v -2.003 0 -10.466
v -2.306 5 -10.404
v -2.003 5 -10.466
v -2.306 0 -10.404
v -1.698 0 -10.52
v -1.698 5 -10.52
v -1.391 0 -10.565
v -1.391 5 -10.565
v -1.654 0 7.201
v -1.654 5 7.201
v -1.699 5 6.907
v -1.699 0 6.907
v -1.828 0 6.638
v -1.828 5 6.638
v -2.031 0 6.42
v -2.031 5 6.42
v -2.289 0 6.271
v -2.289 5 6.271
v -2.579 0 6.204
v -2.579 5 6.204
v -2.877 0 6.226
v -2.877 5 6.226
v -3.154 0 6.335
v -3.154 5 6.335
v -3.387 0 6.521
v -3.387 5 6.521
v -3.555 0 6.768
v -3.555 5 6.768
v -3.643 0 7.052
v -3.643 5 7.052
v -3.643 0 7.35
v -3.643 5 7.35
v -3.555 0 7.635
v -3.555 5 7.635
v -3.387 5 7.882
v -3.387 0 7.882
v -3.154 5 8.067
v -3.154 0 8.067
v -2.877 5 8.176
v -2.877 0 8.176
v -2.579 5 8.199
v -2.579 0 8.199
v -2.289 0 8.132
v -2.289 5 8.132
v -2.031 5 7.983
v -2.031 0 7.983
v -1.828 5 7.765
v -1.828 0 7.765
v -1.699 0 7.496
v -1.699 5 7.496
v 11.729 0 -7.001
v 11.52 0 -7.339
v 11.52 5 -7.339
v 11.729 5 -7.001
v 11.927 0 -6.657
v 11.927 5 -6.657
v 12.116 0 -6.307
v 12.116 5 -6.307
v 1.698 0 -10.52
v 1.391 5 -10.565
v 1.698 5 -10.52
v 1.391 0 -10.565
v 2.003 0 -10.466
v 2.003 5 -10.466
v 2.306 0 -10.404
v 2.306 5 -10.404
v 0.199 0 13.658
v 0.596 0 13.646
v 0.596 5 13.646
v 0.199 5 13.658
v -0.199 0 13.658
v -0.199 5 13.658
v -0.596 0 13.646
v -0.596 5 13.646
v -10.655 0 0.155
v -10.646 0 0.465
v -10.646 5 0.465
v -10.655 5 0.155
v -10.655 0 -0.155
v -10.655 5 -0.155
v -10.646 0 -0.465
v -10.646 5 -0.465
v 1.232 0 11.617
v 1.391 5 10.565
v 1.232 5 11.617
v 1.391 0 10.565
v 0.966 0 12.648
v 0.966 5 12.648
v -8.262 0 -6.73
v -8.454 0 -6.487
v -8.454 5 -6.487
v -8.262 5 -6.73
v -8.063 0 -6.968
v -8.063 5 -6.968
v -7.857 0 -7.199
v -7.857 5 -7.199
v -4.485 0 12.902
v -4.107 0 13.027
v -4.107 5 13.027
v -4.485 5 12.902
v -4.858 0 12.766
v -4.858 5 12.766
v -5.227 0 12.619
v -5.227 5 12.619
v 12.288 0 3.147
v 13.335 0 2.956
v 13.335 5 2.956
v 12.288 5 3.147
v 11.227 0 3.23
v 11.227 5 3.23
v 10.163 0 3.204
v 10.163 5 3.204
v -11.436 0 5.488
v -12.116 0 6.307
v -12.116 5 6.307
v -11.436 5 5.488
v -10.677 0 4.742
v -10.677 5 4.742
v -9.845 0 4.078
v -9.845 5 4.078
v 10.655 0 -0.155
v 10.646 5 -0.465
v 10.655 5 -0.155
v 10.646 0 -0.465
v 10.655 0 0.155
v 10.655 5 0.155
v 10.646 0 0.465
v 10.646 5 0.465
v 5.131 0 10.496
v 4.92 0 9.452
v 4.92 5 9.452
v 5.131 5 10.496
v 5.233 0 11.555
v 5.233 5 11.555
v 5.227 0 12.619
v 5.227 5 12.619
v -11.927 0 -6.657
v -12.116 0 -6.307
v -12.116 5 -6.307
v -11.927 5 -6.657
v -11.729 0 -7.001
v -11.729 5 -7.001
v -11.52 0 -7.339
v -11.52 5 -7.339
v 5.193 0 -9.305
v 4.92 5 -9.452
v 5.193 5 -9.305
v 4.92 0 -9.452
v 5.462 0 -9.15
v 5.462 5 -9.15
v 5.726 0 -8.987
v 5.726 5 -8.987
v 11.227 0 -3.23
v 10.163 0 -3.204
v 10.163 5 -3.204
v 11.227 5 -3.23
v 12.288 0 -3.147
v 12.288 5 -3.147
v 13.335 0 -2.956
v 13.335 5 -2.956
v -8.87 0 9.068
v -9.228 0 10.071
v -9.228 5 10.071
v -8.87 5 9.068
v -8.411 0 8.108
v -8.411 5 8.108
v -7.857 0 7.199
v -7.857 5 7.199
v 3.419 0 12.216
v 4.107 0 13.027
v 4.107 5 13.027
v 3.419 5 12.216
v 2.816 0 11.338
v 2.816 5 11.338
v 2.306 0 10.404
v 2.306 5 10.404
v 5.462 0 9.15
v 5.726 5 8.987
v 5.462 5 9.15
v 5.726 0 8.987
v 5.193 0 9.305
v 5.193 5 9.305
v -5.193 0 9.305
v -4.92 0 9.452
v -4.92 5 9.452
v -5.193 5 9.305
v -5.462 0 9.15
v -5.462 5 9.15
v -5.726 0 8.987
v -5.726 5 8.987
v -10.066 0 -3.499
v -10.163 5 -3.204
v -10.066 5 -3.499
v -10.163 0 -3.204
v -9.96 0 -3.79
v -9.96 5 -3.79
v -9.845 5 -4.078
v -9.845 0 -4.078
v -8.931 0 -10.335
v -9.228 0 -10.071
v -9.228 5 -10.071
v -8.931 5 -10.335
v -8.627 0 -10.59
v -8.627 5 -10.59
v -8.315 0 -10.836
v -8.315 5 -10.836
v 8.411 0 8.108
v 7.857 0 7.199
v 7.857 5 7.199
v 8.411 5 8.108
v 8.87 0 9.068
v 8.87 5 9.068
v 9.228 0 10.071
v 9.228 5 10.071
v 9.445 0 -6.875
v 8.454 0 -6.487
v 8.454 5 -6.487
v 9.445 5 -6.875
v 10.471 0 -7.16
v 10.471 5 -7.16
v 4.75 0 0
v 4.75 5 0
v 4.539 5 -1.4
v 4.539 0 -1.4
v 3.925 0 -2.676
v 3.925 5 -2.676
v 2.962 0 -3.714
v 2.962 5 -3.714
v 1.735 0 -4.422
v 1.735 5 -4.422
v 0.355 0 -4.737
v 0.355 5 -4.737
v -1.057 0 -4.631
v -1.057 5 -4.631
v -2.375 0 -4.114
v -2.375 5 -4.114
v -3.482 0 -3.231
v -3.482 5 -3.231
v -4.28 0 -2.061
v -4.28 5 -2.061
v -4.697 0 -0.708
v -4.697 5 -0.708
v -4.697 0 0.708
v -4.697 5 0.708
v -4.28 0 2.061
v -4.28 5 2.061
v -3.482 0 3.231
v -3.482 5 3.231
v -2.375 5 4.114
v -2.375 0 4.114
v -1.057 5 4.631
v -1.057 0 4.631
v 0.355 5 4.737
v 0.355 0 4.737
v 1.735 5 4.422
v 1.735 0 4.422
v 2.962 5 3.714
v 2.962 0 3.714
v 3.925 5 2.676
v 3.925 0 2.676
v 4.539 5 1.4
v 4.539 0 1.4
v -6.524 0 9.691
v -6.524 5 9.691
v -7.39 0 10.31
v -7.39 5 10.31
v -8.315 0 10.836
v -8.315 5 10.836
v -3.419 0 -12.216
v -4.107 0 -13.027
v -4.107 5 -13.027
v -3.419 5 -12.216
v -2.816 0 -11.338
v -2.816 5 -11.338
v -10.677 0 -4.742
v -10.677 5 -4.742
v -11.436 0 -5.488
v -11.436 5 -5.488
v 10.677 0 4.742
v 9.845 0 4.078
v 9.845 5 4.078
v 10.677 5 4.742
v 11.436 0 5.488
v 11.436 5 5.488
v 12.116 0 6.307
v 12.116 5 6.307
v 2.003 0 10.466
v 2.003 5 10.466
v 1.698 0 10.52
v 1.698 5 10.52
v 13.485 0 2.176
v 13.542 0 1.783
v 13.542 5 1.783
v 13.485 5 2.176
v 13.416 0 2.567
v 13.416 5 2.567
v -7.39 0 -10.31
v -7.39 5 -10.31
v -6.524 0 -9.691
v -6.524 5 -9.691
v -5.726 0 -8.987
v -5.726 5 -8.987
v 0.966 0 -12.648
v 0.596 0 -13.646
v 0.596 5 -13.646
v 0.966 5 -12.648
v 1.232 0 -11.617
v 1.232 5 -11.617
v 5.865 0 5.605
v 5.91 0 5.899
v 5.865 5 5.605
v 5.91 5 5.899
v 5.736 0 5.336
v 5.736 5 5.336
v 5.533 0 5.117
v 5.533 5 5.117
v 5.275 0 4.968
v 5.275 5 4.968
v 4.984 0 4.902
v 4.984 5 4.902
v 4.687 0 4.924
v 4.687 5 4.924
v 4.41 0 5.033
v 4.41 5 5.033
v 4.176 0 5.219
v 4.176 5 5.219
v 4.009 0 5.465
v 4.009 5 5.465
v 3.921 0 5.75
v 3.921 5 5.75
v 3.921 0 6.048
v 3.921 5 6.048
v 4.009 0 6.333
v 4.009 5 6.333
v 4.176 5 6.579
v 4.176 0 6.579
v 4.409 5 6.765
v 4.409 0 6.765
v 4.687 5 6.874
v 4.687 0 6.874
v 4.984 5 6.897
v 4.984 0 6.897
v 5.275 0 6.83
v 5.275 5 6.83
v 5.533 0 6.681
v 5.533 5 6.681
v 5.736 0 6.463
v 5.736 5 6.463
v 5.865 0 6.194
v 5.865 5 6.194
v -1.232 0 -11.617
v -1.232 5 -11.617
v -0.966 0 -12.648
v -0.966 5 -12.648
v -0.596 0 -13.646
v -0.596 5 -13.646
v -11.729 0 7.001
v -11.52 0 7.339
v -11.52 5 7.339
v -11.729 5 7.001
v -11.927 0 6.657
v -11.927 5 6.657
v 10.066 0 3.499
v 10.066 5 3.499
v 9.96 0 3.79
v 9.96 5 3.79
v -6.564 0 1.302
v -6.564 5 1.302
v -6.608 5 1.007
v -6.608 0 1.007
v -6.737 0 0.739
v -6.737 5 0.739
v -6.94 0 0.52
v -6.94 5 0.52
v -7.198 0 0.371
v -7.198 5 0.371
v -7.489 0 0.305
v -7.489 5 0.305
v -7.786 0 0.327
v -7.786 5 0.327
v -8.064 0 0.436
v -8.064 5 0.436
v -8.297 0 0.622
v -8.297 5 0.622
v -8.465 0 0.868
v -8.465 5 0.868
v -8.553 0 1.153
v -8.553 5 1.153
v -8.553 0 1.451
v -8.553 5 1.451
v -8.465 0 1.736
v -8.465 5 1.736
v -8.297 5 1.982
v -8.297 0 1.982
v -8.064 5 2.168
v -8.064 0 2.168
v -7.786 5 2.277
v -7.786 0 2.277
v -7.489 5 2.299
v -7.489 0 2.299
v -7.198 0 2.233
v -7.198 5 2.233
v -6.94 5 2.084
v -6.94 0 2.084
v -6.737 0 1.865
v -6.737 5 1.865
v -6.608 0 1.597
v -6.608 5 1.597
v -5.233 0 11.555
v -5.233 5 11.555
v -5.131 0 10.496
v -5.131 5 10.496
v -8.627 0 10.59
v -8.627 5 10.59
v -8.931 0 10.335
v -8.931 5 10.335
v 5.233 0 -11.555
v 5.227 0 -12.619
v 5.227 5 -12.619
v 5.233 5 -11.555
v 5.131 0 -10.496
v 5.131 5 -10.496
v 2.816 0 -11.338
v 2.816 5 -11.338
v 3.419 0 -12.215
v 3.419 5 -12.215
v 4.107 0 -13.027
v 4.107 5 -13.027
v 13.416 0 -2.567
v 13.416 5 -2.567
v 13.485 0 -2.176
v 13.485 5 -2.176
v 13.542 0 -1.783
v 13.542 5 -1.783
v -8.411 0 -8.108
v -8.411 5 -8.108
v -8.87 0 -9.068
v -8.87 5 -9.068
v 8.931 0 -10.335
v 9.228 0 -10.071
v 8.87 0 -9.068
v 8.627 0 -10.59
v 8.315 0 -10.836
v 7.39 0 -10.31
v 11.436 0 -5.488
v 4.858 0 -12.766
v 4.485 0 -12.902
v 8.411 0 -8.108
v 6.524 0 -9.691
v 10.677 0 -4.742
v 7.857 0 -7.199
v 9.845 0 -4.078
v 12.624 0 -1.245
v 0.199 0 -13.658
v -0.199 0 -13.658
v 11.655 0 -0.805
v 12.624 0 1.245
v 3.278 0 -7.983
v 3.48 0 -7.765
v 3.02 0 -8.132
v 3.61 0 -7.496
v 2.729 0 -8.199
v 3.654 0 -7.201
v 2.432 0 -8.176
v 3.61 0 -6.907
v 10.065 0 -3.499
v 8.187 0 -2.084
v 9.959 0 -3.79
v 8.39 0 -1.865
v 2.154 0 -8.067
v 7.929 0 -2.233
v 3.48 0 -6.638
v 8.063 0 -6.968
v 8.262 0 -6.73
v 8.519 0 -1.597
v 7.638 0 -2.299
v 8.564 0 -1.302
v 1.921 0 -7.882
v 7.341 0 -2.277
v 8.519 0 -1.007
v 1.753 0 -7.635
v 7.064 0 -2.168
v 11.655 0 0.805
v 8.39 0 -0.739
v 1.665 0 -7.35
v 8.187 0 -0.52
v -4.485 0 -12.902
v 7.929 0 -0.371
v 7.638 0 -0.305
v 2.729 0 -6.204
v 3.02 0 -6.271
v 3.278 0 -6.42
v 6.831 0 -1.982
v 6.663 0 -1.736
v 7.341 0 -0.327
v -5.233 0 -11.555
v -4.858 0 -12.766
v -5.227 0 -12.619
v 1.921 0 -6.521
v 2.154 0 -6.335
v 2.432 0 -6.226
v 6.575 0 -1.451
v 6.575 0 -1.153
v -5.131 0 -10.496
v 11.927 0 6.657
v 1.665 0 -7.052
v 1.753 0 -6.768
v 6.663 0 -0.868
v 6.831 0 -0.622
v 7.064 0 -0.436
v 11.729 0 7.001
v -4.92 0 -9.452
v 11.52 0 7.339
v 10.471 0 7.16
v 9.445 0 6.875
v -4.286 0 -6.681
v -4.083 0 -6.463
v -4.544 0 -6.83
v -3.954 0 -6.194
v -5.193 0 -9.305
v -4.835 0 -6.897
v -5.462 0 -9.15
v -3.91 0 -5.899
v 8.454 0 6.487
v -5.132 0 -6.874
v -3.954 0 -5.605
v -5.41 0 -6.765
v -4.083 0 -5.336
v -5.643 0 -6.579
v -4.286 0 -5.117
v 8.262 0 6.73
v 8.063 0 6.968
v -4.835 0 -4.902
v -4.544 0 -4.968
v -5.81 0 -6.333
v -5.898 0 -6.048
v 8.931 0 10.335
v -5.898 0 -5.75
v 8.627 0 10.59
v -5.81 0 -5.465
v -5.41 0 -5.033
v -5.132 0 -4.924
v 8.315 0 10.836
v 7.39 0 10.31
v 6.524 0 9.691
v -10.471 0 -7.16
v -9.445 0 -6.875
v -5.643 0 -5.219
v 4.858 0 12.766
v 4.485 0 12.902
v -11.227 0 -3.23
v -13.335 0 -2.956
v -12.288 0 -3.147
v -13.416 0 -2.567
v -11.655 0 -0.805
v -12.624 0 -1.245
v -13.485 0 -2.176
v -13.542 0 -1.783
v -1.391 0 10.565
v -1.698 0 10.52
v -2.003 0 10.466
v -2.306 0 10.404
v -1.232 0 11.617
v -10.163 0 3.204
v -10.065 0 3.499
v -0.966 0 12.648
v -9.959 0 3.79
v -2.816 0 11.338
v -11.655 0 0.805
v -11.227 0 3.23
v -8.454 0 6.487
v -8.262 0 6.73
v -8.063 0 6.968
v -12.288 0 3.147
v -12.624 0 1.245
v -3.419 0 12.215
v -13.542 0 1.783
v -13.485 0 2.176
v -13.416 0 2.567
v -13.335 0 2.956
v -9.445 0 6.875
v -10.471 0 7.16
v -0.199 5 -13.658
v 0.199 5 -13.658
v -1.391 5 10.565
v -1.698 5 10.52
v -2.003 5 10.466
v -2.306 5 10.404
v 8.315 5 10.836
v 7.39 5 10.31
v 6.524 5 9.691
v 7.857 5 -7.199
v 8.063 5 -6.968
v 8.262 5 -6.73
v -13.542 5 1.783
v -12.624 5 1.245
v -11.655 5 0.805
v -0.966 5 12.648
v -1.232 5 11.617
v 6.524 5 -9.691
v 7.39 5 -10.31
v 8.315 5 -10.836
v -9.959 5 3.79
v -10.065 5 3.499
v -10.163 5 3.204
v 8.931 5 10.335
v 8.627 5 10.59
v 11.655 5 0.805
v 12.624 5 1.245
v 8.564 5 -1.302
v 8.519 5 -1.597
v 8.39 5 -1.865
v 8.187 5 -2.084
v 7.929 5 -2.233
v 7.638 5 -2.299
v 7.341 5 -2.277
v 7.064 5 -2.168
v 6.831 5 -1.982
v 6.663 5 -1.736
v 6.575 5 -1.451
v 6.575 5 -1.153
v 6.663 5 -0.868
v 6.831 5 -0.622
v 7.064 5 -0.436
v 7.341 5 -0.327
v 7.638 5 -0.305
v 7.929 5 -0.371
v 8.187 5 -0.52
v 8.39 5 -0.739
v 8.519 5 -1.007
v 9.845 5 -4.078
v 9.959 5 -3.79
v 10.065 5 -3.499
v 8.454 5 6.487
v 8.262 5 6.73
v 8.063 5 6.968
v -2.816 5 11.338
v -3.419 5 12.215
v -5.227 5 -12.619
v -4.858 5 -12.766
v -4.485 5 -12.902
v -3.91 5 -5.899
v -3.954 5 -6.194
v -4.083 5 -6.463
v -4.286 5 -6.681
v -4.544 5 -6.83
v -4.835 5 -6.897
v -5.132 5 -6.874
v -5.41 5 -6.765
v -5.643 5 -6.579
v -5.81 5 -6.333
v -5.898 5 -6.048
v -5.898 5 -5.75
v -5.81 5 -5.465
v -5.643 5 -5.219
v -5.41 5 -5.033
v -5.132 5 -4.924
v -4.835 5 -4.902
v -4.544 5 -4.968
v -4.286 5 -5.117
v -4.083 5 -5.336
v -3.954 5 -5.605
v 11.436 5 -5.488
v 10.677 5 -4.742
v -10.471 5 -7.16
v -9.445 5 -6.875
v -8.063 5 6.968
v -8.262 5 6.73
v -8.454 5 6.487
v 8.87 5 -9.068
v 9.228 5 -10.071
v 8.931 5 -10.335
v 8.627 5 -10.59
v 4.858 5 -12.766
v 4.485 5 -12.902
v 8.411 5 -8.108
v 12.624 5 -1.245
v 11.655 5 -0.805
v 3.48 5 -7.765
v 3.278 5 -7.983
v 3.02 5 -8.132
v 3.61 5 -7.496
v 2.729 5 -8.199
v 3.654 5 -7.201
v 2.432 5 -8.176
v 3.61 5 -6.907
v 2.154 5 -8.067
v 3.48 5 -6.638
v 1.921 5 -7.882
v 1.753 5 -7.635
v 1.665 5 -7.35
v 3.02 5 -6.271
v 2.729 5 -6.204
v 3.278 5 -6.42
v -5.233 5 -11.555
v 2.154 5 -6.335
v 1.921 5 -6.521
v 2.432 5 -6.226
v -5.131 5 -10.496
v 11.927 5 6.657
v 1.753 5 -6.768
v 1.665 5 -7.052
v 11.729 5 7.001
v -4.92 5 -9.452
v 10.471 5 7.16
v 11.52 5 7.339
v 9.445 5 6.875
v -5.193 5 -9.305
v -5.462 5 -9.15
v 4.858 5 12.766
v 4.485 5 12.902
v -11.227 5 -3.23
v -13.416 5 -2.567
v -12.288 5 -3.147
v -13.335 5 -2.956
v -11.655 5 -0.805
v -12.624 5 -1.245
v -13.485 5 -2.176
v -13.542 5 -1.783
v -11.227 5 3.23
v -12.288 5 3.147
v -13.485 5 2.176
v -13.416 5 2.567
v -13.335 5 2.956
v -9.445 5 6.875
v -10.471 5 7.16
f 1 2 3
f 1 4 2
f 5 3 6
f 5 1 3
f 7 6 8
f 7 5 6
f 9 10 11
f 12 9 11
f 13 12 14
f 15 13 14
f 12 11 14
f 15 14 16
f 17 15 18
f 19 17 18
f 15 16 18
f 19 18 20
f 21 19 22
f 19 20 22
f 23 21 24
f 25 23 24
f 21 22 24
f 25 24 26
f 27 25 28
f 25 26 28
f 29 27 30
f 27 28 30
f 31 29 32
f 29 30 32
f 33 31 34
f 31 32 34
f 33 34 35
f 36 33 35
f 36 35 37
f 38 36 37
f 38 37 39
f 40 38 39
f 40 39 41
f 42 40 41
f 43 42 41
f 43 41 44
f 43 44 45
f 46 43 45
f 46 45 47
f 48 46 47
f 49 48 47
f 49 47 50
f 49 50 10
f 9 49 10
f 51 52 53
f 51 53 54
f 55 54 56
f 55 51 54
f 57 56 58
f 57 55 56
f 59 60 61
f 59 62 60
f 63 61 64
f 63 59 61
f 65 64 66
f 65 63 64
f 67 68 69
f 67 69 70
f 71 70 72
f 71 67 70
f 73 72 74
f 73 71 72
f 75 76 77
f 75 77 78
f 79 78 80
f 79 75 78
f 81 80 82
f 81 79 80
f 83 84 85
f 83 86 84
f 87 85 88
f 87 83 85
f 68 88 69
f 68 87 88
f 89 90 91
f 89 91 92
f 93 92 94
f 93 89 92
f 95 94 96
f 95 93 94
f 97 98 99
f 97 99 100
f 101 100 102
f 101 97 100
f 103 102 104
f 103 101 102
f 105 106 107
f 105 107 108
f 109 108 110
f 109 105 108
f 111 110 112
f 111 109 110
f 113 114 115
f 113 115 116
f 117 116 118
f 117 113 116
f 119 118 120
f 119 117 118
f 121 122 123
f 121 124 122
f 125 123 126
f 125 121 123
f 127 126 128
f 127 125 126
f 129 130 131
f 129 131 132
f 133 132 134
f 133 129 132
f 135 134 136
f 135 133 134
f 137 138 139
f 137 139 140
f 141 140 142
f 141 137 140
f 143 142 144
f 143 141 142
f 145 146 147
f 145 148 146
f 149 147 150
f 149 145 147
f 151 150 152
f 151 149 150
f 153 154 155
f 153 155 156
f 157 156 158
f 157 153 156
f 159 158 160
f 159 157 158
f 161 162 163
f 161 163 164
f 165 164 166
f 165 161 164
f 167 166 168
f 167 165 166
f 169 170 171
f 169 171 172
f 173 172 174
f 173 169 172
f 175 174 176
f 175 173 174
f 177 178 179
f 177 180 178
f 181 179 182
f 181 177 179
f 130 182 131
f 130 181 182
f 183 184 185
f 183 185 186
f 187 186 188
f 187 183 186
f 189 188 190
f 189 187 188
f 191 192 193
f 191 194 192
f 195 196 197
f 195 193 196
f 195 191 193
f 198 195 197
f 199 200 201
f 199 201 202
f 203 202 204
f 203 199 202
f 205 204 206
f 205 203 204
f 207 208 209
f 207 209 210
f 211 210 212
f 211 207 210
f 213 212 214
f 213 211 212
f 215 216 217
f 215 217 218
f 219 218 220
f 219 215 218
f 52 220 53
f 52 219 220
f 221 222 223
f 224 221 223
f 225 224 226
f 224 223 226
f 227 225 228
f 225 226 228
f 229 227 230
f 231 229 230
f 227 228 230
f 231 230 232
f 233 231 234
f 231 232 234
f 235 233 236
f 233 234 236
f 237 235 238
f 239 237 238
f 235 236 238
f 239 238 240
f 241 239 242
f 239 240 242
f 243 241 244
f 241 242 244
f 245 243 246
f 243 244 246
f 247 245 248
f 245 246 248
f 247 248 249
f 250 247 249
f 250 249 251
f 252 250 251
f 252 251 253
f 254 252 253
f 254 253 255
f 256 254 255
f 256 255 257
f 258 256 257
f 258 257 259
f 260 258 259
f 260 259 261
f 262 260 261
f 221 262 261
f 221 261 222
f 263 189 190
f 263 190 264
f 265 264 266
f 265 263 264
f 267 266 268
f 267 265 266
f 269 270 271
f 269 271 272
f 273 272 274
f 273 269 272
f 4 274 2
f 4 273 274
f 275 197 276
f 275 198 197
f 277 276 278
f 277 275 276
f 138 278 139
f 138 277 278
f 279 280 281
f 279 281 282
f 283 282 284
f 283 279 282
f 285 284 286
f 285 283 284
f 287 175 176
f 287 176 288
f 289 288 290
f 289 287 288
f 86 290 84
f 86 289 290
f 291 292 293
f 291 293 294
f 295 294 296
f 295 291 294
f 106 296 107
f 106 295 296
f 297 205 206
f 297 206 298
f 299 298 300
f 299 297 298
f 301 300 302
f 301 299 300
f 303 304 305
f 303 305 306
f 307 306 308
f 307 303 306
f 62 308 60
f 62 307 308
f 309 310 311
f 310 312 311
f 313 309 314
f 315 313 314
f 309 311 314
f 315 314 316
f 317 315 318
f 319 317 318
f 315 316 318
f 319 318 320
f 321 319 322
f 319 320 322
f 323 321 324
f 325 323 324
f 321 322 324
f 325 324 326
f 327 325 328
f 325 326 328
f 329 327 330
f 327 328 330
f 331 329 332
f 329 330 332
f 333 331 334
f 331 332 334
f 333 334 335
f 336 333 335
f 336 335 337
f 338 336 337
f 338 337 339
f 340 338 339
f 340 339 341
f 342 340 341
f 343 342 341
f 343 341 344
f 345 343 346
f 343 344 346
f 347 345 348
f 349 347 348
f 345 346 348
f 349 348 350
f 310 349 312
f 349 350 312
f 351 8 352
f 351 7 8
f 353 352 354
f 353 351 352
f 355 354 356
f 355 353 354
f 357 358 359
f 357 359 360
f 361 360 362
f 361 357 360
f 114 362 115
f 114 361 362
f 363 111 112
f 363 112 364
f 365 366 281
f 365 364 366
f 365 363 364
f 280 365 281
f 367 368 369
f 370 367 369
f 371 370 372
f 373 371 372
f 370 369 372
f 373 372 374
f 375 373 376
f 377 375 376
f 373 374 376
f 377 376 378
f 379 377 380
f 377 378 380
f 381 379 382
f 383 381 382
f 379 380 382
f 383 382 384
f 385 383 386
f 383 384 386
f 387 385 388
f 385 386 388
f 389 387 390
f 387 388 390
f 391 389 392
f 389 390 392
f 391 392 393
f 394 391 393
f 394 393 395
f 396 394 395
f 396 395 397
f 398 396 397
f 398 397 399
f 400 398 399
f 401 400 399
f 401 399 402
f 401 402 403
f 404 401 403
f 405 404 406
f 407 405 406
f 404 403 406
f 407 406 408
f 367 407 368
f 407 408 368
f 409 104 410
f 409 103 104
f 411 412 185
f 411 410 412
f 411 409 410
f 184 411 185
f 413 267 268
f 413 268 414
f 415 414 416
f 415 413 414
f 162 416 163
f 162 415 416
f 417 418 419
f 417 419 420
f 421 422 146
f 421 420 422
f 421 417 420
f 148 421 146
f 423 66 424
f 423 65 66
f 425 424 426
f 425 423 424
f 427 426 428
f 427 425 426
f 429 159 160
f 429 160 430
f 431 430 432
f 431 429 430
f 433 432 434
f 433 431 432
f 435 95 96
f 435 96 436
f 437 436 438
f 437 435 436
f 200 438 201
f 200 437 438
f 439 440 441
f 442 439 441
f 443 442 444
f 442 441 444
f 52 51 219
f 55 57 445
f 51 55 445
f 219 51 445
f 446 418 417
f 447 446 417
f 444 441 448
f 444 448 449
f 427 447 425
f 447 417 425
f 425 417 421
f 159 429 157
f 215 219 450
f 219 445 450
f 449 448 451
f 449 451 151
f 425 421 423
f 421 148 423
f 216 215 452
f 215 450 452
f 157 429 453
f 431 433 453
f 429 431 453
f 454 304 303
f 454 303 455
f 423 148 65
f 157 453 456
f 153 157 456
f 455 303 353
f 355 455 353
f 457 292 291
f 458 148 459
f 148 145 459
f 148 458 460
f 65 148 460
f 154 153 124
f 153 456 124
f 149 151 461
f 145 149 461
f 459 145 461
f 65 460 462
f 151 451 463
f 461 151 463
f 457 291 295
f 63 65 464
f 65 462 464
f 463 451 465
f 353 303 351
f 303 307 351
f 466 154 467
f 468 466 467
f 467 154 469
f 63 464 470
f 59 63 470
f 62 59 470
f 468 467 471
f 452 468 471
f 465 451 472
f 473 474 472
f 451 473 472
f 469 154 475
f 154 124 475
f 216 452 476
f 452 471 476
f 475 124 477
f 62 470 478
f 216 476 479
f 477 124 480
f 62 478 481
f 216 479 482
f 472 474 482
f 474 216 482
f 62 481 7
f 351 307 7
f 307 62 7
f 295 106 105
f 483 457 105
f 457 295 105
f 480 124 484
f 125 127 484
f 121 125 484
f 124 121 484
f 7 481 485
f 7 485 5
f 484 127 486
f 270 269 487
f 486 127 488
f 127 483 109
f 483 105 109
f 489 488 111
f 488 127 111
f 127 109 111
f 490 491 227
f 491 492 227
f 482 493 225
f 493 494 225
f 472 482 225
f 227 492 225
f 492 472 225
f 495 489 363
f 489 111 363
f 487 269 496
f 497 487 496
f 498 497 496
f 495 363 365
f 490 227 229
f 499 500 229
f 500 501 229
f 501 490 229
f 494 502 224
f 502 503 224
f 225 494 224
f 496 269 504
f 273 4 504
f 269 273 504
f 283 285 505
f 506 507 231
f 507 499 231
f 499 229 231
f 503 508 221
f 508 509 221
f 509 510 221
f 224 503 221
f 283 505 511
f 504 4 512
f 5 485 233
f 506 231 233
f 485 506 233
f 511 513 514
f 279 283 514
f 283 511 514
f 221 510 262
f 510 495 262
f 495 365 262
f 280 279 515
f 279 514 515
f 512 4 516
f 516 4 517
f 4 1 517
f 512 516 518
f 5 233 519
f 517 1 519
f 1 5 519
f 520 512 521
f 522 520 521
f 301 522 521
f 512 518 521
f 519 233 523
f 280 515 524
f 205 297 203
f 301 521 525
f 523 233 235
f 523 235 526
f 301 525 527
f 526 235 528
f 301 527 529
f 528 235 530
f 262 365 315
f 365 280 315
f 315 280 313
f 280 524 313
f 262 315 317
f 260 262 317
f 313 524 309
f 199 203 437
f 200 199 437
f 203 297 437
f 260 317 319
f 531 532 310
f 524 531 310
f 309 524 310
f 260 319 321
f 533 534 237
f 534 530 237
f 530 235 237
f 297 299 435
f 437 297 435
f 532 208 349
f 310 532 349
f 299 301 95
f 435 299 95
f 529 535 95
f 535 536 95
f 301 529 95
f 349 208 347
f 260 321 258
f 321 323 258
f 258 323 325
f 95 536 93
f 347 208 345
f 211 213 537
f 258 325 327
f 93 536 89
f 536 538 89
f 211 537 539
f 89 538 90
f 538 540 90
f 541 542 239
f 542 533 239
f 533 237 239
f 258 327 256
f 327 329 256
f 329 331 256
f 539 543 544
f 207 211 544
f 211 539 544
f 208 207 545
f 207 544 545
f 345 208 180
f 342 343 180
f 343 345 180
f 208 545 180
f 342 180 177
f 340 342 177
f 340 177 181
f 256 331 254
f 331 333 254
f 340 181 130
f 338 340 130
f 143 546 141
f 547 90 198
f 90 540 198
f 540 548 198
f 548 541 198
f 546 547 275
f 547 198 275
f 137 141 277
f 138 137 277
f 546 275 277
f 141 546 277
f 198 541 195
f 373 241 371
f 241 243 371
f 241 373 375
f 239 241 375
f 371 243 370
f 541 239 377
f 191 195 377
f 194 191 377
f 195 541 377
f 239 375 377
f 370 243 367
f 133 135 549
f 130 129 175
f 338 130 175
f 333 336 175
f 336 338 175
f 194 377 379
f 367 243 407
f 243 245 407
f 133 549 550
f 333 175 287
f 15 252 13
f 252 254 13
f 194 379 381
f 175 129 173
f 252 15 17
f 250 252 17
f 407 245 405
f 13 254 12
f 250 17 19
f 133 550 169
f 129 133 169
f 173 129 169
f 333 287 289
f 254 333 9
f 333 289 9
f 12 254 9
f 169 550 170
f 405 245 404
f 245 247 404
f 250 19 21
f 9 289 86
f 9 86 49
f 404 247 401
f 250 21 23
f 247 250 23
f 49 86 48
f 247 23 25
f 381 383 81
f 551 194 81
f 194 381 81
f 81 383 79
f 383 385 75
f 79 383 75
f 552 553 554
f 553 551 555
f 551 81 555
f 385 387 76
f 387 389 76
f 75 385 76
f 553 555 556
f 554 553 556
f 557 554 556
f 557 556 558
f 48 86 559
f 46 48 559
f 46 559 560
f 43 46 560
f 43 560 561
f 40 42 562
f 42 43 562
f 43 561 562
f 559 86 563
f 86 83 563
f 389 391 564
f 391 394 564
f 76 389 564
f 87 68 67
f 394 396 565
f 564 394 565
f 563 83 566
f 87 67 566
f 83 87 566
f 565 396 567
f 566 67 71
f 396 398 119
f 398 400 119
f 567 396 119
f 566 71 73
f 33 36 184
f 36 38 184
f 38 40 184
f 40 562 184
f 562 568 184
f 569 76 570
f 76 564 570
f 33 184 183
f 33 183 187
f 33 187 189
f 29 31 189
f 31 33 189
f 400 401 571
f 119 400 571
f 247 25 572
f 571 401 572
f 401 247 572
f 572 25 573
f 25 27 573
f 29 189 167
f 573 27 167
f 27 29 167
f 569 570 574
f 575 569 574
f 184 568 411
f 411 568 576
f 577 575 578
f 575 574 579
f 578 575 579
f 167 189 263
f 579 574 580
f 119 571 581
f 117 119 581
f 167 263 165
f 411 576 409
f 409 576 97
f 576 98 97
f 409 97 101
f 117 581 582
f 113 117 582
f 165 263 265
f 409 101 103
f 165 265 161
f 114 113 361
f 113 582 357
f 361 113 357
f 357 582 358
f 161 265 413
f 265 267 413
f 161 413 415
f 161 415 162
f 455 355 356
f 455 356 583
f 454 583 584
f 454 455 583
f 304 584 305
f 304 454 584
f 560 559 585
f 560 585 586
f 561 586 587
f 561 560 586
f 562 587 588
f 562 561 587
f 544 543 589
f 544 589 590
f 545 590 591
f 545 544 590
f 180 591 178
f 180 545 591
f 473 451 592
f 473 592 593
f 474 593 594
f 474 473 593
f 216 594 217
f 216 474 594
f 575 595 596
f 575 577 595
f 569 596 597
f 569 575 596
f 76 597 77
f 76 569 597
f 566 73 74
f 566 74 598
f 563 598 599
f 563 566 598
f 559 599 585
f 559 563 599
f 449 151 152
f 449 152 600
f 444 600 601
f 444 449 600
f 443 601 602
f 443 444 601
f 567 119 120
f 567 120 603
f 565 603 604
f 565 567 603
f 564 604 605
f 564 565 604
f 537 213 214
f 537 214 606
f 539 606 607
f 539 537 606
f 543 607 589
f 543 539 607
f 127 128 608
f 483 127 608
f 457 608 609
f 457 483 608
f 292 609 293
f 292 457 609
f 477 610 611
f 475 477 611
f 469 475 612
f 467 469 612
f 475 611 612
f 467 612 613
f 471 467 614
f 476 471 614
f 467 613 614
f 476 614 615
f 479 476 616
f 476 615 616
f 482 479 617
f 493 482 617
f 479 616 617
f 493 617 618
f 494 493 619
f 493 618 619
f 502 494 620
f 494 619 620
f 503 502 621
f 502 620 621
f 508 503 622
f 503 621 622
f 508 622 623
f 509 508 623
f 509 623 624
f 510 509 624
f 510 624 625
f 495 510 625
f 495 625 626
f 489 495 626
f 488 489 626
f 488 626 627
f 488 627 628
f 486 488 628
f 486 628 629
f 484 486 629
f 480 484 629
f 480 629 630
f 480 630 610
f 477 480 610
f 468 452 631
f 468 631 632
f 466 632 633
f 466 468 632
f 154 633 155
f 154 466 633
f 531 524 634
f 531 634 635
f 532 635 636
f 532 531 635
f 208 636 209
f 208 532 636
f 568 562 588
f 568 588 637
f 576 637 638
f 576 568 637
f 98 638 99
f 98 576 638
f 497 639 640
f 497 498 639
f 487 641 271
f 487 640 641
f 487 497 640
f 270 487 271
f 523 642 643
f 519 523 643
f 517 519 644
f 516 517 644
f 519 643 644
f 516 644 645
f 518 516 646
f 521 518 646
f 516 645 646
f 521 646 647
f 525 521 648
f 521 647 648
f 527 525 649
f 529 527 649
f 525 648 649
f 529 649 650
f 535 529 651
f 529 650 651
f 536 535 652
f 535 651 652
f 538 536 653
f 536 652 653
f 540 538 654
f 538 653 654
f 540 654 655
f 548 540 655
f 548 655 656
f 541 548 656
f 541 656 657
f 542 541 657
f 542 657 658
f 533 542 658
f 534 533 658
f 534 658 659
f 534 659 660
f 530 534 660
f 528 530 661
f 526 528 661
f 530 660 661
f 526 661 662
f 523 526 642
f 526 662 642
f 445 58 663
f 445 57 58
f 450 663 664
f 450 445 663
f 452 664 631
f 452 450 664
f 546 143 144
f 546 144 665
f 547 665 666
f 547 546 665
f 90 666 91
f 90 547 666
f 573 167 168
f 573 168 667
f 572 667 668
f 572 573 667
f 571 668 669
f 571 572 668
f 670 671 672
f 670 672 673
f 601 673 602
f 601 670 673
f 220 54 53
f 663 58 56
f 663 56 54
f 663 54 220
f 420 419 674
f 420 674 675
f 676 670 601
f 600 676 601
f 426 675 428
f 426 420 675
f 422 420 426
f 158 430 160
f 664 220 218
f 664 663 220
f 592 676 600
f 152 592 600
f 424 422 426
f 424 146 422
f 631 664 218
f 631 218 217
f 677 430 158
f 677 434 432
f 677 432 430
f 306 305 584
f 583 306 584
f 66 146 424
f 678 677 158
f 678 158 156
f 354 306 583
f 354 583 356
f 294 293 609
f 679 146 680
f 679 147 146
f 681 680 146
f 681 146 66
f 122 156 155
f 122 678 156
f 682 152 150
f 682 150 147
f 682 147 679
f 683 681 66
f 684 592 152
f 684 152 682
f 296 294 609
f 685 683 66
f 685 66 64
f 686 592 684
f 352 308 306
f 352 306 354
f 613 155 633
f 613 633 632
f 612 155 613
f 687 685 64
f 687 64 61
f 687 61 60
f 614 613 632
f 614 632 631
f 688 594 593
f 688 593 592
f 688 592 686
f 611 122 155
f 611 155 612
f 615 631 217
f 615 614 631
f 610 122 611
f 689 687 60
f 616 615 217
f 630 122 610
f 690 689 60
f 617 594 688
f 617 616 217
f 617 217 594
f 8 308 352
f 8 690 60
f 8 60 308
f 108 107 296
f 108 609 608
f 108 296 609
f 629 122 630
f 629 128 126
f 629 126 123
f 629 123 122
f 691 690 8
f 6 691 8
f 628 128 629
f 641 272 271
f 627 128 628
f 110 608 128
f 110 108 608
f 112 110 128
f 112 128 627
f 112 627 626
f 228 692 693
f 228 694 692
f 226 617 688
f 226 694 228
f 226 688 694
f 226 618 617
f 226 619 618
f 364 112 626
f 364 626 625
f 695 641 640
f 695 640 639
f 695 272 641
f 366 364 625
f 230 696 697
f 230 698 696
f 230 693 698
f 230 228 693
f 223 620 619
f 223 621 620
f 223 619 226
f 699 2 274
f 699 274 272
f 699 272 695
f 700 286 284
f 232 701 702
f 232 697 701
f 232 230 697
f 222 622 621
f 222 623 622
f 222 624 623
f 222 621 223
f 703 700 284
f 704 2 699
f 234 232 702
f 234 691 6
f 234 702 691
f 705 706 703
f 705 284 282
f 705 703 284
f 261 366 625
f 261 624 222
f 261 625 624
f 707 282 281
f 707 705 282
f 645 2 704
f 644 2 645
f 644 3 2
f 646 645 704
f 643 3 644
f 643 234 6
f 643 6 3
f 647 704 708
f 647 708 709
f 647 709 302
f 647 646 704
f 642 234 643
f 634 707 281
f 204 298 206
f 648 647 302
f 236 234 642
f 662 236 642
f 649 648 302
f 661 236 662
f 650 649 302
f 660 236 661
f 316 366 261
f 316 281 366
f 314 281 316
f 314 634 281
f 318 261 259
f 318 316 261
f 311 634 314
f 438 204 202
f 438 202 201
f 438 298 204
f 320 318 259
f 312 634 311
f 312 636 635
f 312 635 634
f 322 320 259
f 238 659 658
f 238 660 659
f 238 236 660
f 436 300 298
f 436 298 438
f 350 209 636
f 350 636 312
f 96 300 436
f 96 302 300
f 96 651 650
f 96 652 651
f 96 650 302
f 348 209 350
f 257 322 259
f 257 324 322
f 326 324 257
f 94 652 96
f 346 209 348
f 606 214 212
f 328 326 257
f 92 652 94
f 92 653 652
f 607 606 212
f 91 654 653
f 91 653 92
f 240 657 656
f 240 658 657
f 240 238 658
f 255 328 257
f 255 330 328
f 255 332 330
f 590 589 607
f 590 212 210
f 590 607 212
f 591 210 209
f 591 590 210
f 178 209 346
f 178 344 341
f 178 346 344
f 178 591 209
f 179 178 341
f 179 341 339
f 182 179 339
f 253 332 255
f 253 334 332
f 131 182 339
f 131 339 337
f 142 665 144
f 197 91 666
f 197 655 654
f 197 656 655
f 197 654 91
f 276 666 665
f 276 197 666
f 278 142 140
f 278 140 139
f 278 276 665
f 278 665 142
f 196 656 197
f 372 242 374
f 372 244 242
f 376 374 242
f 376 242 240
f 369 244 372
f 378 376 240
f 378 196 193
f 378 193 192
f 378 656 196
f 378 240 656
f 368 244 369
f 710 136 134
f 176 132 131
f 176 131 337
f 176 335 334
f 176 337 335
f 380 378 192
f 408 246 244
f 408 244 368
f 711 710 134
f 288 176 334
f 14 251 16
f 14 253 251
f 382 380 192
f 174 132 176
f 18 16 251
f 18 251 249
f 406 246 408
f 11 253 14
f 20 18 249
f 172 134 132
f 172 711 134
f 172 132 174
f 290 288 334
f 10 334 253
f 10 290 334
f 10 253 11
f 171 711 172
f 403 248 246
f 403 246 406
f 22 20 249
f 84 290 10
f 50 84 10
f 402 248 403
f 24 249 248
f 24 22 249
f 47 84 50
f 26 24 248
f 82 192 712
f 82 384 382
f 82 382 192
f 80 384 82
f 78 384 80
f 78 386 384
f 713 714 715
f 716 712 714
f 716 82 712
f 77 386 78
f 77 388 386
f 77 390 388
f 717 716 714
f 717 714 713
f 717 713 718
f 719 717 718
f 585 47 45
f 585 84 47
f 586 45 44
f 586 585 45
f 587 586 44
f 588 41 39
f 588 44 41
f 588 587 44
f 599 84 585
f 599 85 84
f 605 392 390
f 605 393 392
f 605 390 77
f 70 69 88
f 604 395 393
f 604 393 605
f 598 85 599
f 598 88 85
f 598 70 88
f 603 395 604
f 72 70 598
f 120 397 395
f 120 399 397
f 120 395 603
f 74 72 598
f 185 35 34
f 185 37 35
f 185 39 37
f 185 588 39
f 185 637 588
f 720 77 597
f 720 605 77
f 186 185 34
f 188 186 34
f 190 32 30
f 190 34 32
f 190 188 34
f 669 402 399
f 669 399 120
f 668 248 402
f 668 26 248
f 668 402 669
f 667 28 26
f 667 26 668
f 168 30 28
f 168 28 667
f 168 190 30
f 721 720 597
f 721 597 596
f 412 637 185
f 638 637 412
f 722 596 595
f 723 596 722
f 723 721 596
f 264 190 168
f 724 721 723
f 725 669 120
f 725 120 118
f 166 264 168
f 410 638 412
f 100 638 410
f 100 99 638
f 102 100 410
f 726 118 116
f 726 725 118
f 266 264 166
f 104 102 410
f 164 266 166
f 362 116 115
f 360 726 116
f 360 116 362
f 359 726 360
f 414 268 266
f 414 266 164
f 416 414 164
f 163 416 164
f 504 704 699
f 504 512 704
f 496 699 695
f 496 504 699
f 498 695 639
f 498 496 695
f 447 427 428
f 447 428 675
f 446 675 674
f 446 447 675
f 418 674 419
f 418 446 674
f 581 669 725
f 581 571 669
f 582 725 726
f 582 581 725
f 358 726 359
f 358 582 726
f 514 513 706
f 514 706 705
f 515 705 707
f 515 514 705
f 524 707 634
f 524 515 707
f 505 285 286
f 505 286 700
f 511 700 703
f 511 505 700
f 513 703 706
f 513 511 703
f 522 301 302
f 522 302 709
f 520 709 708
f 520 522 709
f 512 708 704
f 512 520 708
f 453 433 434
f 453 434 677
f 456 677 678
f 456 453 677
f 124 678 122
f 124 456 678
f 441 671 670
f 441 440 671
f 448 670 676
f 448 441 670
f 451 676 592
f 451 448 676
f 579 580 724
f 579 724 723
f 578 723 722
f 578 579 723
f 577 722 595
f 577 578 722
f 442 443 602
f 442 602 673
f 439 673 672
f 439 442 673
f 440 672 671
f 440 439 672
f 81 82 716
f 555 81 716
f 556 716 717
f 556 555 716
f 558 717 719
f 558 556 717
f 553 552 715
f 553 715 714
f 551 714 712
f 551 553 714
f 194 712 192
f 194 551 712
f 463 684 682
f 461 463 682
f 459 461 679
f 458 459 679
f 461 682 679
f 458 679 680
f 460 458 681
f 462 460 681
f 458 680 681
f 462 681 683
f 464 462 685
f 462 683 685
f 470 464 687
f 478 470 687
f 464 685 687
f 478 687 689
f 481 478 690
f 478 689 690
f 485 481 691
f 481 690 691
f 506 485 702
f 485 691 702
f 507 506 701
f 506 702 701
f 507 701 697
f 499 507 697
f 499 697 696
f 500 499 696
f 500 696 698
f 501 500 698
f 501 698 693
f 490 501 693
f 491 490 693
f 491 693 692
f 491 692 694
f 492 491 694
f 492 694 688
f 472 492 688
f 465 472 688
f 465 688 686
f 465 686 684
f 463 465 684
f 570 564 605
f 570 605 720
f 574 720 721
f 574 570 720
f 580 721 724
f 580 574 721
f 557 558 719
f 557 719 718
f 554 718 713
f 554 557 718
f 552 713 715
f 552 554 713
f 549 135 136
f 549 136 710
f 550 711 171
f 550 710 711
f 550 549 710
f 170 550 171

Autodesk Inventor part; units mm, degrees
ref_plane "YZ Plane" through (0, 0, 0) normal (1, 0, 0) x (0, 1, 0)
ref_plane "XZ Plane" through (0, 0, 0) normal (0, 1, 0) x (-1, 0, 0)
ref_plane "XY Plane" through (0, 0, 0) normal (0, 0, 1) x (1, 0, 0)
sketch "Эскиз1" plane through (0, 0, 0) normal (0, 1, 0) x (-1, 0, 0)
  arc A0 (-8.6049, 20.7741) -> (-8.0517, 15.4673) centre (8.9595, 19.9228) ccw
  arc A1 (-8.0517, 15.4673) -> (-9.3692, 14.7066) centre (0, 0) ccw
  arc A2 (-9.3692, 14.7066) -> (-13.6885, 17.8391) centre (-21.7334, 2.2022) ccw
  arc A3 (-13.6885, 17.8391) -> (-15.1912, 16.5782) centre (0, 0) ccw
  arc A4 (-15.1912, 16.5782) -> (-12.8563, 11.7806) centre (1.6052, 21.7856) ccw
  arc A5 (-12.8563, 11.7806) -> (-13.8341, 10.6153) centre (0, 0) ccw
  arc A6 (-13.8341, 10.6153) -> (-18.9643, 12.0816) centre (-21.1759, -5.3638) ccw
  arc A7 (-18.9643, 12.0816) -> (-19.9451, 10.3828) centre (0, 0) ccw
  arc A8 (-19.9451, 10.3828) -> (-16.1101, 6.673) centre (-5.9427, 21.0208) ccw
  arc A9 (-16.1101, 6.673) -> (-16.6304, 5.2436) centre (0, 0) ccw
  arc A10 (-16.6304, 5.2436) -> (-21.9528, 4.8668) centre (-18.0643, -12.2829) ccw
  arc A11 (-21.9528, 4.8668) -> (-22.2934, 2.935) centre (0, 0) ccw
  arc A12 (-22.2934, 2.935) -> (-17.4209, 0.7606) centre (-12.7739, 17.7205) ccw
  arc A13 (-17.4209, 0.7606) -> (-17.4209, -0.7606) centre (0, 0) ccw
  arc A14 (-17.4209, -0.7606) -> (-22.2934, -2.935) centre (-12.7739, -17.7205) ccw
  arc A15 (-22.2934, -2.935) -> (-21.9528, -4.8668) centre (0, 0) ccw
  arc A16 (-21.9528, -4.8668) -> (-16.6304, -5.2436) centre (-18.0643, 12.2829) ccw
  arc A17 (-16.6304, -5.2436) -> (-16.1101, -6.673) centre (0, 0) ccw
  arc A18 (-16.1101, -6.673) -> (-19.9451, -10.3828) centre (-5.9427, -21.0208) ccw
  arc A19 (-19.9451, -10.3828) -> (-18.9643, -12.0816) centre (0, 0) ccw
  arc A20 (-18.9643, -12.0816) -> (-13.8341, -10.6153) centre (-21.1759, 5.3638) ccw
  arc A21 (-13.8341, -10.6153) -> (-12.8563, -11.7806) centre (0, 0) ccw
  arc A22 (-12.8563, -11.7806) -> (-15.1912, -16.5782) centre (1.6052, -21.7856) ccw
  arc A23 (-15.1912, -16.5782) -> (-13.6885, -17.8391) centre (0, 0) ccw
  arc A24 (-13.6885, -17.8391) -> (-9.3692, -14.7066) centre (-21.7334, -2.2022) ccw
  arc A25 (-9.3692, -14.7066) -> (-8.0517, -15.4673) centre (0, 0) ccw
  arc A26 (-8.0517, -15.4673) -> (-8.6049, -20.7741) centre (8.9595, -19.9228) ccw
  arc A27 (-8.6049, -20.7741) -> (-6.7616, -21.445) centre (0, 0) ccw
  arc A28 (-6.7616, -21.445) -> (-3.7742, -17.0242) centre (-19.6695, -9.5027) ccw
  arc A29 (-3.7742, -17.0242) -> (-2.2761, -17.2883) centre (0, 0) ccw
  arc A30 (-2.2761, -17.2883) -> (-0.9808, -22.4644) centre (15.2332, -15.6569) ccw
  arc A31 (-0.9808, -22.4644) -> (0.9808, -22.4644) centre (0, 0) ccw
  arc A32 (0.9808, -22.4644) -> (2.2761, -17.2883) centre (-15.2332, -15.6569) ccw
  arc A33 (2.2761, -17.2883) -> (3.7742, -17.0242) centre (0, 0) ccw
  arc A34 (3.7742, -17.0242) -> (6.7616, -21.445) centre (19.6695, -9.5027) ccw
  arc A35 (6.7616, -21.445) -> (8.6049, -20.7741) centre (0, 0) ccw
  arc A36 (8.6049, -20.7741) -> (8.0517, -15.4673) centre (-8.9595, -19.9228) ccw
  arc A37 (8.0517, -15.4673) -> (9.3692, -14.7066) centre (0, 0) ccw
  arc A38 (9.3692, -14.7066) -> (13.6885, -17.8391) centre (21.7334, -2.2022) ccw
  arc A39 (13.6885, -17.8391) -> (15.1912, -16.5782) centre (0, 0) ccw
  arc A40 (15.1912, -16.5782) -> (12.8563, -11.7806) centre (-1.6052, -21.7856) ccw
  arc A41 (12.8563, -11.7806) -> (13.8341, -10.6153) centre (0, 0) ccw
  arc A42 (13.8341, -10.6153) -> (18.9643, -12.0816) centre (21.1759, 5.3638) ccw
  arc A43 (18.9643, -12.0816) -> (19.9451, -10.3828) centre (0, 0) ccw
  arc A44 (19.9451, -10.3828) -> (16.1101, -6.673) centre (5.9427, -21.0208) ccw
  arc A45 (16.1101, -6.673) -> (16.6304, -5.2436) centre (0, 0) ccw
  arc A46 (16.6304, -5.2436) -> (21.9528, -4.8668) centre (18.0643, 12.2829) ccw
  arc A47 (21.9528, -4.8668) -> (22.2934, -2.935) centre (0, 0) ccw
  arc A48 (22.2934, -2.935) -> (17.4209, -0.7606) centre (12.7739, -17.7205) ccw
  arc A49 (17.4209, -0.7606) -> (17.4209, 0.7606) centre (0, 0) ccw
  arc A50 (17.4209, 0.7606) -> (22.2934, 2.935) centre (12.7739, 17.7205) ccw
  arc A51 (22.2934, 2.935) -> (21.9528, 4.8668) centre (0, 0) ccw
  arc A52 (21.9528, 4.8668) -> (16.6304, 5.2436) centre (18.0643, -12.2829) ccw
  arc A53 (16.6304, 5.2436) -> (16.1101, 6.673) centre (0, 0) ccw
  arc A54 (16.1101, 6.673) -> (19.9451, 10.3828) centre (5.9427, 21.0208) ccw
  arc A55 (19.9451, 10.3828) -> (18.9643, 12.0816) centre (0, 0) ccw
  arc A56 (18.9643, 12.0816) -> (13.8341, 10.6153) centre (21.1759, -5.3638) ccw
  arc A57 (13.8341, 10.6153) -> (12.8563, 11.7806) centre (0, 0) ccw
  arc A58 (12.8563, 11.7806) -> (15.1912, 16.5782) centre (-1.6052, 21.7856) ccw
  arc A59 (15.1912, 16.5782) -> (13.6885, 17.8391) centre (0, 0) ccw
  arc A60 (13.6885, 17.8391) -> (9.3692, 14.7066) centre (21.7334, 2.2022) ccw
  arc A61 (9.3692, 14.7066) -> (8.0517, 15.4673) centre (0, 0) ccw
  arc A62 (8.0517, 15.4673) -> (8.6049, 20.7741) centre (-8.9595, 19.9228) ccw
  arc A63 (8.6049, 20.7741) -> (6.7616, 21.445) centre (0, 0) ccw
  arc A64 (6.7616, 21.445) -> (3.7742, 17.0242) centre (19.6695, 9.5027) ccw
  arc A65 (3.7742, 17.0242) -> (2.2761, 17.2883) centre (0, 0) ccw
  arc A66 (2.2761, 17.2883) -> (0.9808, 22.4644) centre (-15.2332, 15.6569) ccw
  arc A67 (0.9808, 22.4644) -> (-0.9808, 22.4644) centre (0, 0) ccw
  arc A68 (-0.9808, 22.4644) -> (-2.2761, 17.2883) centre (15.2332, 15.6569) ccw
  arc A69 (-2.2761, 17.2883) -> (-3.7742, 17.0242) centre (0, 0) ccw
  arc A70 (-3.7742, 17.0242) -> (-6.7616, 21.445) centre (-19.6695, 9.5027) ccw
  arc A71 (-6.7616, 21.445) -> (-8.6049, 20.7741) centre (0, 0) ccw
  arc A72 (-5.2271, 12.6194) -> (-4.9205, 9.4522) centre (5.1709, 12.0276) ccw
  arc A73 (-4.9205, 9.4522) -> (-5.7256, 8.9874) centre (0, 0) ccw
  arc A74 (-5.7256, 8.9874) -> (-8.3151, 10.8365) centre (-13.0016, 1.5357) ccw
  arc A75 (-8.3151, 10.8365) -> (-9.228, 10.0706) centre (0, 0) ccw
  arc A76 (-9.228, 10.0706) -> (-7.8566, 7.1993) centre (0.7454, 13.0708) ccw
  arc A77 (-7.8566, 7.1993) -> (-8.4542, 6.4871) centre (0, 0) ccw
  arc A78 (-8.4542, 6.4871) -> (-11.52, 7.339) centre (-12.7428, -3.0038) ccw
  arc A79 (-11.52, 7.339) -> (-12.1158, 6.3071) centre (0, 0) ccw
  arc A80 (-12.1158, 6.3071) -> (-9.8451, 4.078) centre (-3.77, 12.5374) ccw
  arc A81 (-9.8451, 4.078) -> (-10.163, 3.2044) centre (0, 0) ccw
  arc A82 (-10.163, 3.2044) -> (-13.3353, 2.9564) centre (-10.9469, -7.1809) ccw
  arc A83 (-13.3353, 2.9564) -> (-13.5423, 1.7829) centre (0, 0) ccw
  arc A84 (-13.5423, 1.7829) -> (-10.6461, 0.4648) centre (-7.8307, 10.4919) ccw
  arc A85 (-10.6461, 0.4648) -> (-10.6461, -0.4648) centre (0, 0) ccw
  arc A86 (-10.6461, -0.4648) -> (-13.5423, -1.7829) centre (-7.8307, -10.4919) ccw
  arc A87 (-13.5423, -1.7829) -> (-13.3353, -2.9564) centre (0, 0) ccw
  arc A88 (-13.3353, -2.9564) -> (-10.163, -3.2044) centre (-10.9469, 7.1809) ccw
  arc A89 (-10.163, -3.2044) -> (-9.8451, -4.078) centre (0, 0) ccw
  arc A90 (-9.8451, -4.078) -> (-12.1158, -6.3071) centre (-3.77, -12.5374) ccw
  arc A91 (-12.1158, -6.3071) -> (-11.52, -7.339) centre (0, 0) ccw
  arc A92 (-11.52, -7.339) -> (-8.4542, -6.4871) centre (-12.7428, 3.0038) ccw
  arc A93 (-8.4542, -6.4871) -> (-7.8566, -7.1993) centre (0, 0) ccw
  arc A94 (-7.8566, -7.1993) -> (-9.228, -10.0706) centre (0.7454, -13.0708) ccw
  arc A95 (-9.228, -10.0706) -> (-8.3151, -10.8365) centre (0, 0) ccw
  arc A96 (-8.3151, -10.8365) -> (-5.7256, -8.9874) centre (-13.0016, -1.5357) ccw
  arc A97 (-5.7256, -8.9874) -> (-4.9205, -9.4522) centre (0, 0) ccw
  arc A98 (-4.9205, -9.4522) -> (-5.2271, -12.6194) centre (5.1709, -12.0276) ccw
  arc A99 (-5.2271, -12.6194) -> (-4.1074, -13.0269) centre (0, 0) ccw
  arc A100 (-4.1074, -13.0269) -> (-2.3064, -10.4037) centre (-11.6923, -5.8899) ccw
  arc A101 (-2.3064, -10.4037) -> (-1.3909, -10.5651) centre (0, 0) ccw
  arc A102 (-1.3909, -10.5651) -> (-0.5958, -13.6461) centre (8.9727, -9.5337) ccw
  arc A103 (-0.5958, -13.6461) -> (0.5958, -13.6461) centre (0, 0) ccw
  arc A104 (0.5958, -13.6461) -> (1.3909, -10.5651) centre (-8.9727, -9.5337) ccw
  arc A105 (1.3909, -10.5651) -> (2.3064, -10.4037) centre (0, 0) ccw
  arc A106 (2.3064, -10.4037) -> (4.1074, -13.0269) centre (11.6923, -5.8899) ccw
  arc A107 (4.1074, -13.0269) -> (5.2271, -12.6194) centre (0, 0) ccw
  arc A108 (5.2271, -12.6194) -> (4.9205, -9.4522) centre (-5.1709, -12.0276) ccw
  arc A109 (4.9205, -9.4522) -> (5.7256, -8.9874) centre (0, 0) ccw
  arc A110 (5.7256, -8.9874) -> (8.3151, -10.8365) centre (13.0016, -1.5357) ccw
  arc A111 (8.3151, -10.8365) -> (9.228, -10.0706) centre (0, 0) ccw
  arc A112 (9.228, -10.0706) -> (7.8566, -7.1993) centre (-0.7454, -13.0708) ccw
  arc A113 (7.8566, -7.1993) -> (8.4542, -6.4871) centre (0, 0) ccw
  arc A114 (8.4542, -6.4871) -> (11.52, -7.339) centre (12.7428, 3.0038) ccw
  arc A115 (11.52, -7.339) -> (12.1158, -6.3071) centre (0, 0) ccw
  arc A116 (12.1158, -6.3071) -> (9.8451, -4.078) centre (3.77, -12.5374) ccw
  arc A117 (9.8451, -4.078) -> (10.163, -3.2044) centre (0, 0) ccw
  arc A118 (10.163, -3.2044) -> (13.3353, -2.9564) centre (10.9469, 7.1809) ccw
  arc A119 (13.3353, -2.9564) -> (13.5423, -1.7829) centre (0, 0) ccw
  arc A120 (13.5423, -1.7829) -> (10.6461, -0.4648) centre (7.8307, -10.4919) ccw
  arc A121 (10.6461, -0.4648) -> (10.6461, 0.4648) centre (0, 0) ccw
  arc A122 (10.6461, 0.4648) -> (13.5423, 1.7829) centre (7.8307, 10.4919) ccw
  arc A123 (13.5423, 1.7829) -> (13.3353, 2.9564) centre (0, 0) ccw
  arc A124 (13.3353, 2.9564) -> (10.163, 3.2044) centre (10.9469, -7.1809) ccw
  arc A125 (10.163, 3.2044) -> (9.8451, 4.078) centre (0, 0) ccw
  arc A126 (9.8451, 4.078) -> (12.1158, 6.3071) centre (3.77, 12.5374) ccw
  arc A127 (12.1158, 6.3071) -> (11.52, 7.339) centre (0, 0) ccw
  arc A128 (11.52, 7.339) -> (8.4542, 6.4871) centre (12.7428, -3.0038) ccw
  arc A129 (8.4542, 6.4871) -> (7.8566, 7.1993) centre (0, 0) ccw
  arc A130 (7.8566, 7.1993) -> (9.228, 10.0706) centre (-0.7454, 13.0708) ccw
  arc A131 (9.228, 10.0706) -> (8.3151, 10.8365) centre (0, 0) ccw
  arc A132 (8.3151, 10.8365) -> (5.7256, 8.9874) centre (13.0016, 1.5357) ccw
  arc A133 (5.7256, 8.9874) -> (4.9205, 9.4522) centre (0, 0) ccw
  arc A134 (4.9205, 9.4522) -> (5.2271, 12.6194) centre (-5.1709, 12.0276) ccw
  arc A135 (5.2271, 12.6194) -> (4.1074, 13.0269) centre (0, 0) ccw
  arc A136 (4.1074, 13.0269) -> (2.3064, 10.4037) centre (11.6923, 5.8899) ccw
  arc A137 (2.3064, 10.4037) -> (1.3909, 10.5651) centre (0, 0) ccw
  arc A138 (1.3909, 10.5651) -> (0.5958, 13.6461) centre (-8.9727, 9.5337) ccw
  arc A139 (0.5958, 13.6461) -> (-0.5958, 13.6461) centre (0, 0) ccw
  arc A140 (-0.5958, 13.6461) -> (-1.3909, 10.5651) centre (8.9727, 9.5337) ccw
  arc A141 (-1.3909, 10.5651) -> (-2.3064, 10.4037) centre (0, 0) ccw
  arc A142 (-2.3064, 10.4037) -> (-4.1074, 13.0269) centre (-11.6923, 5.8899) ccw
  arc A143 (-4.1074, 13.0269) -> (-5.2271, 12.6194) centre (0, 0) ccw
extrude "Выдавливание1" add sketch "Эскиз1" along normal blind 5 contours A143 A142 A141 A140 A139 A138 A137 A136 A135 A134 A133 A132 A131 A130 A129 A128 A127 A126 A125 A124 A123 A122 A121 A120 A119 A118 A117 A116 A115 A114 A113 A112 A111 A110 A109 A108 A107 A106 A105 A104 A103 A102 A101 A100 A99 A98 A97 A96 A95 A94 A93 A92 A91 A90 A89 A88 A87 A86 A85 A84 A83 A82 A81 A80 A79 A78 A77 A76 A75 A74 A73 A72
sketch "Эскиз2" plane through (0, 5, 0) normal (0, 1, 0) x (1, 0, 0)
  arc A0 (14.2029, 0.3107) -> (13.9664, 4.3996) centre (13.4768, 2.32) ccw
  line L0 (13.9664, 4.3996) -> (5.393, 4.3996)
  line L1 (5.393, 4.3996) -> (6.8323, 12.4554)
  arc A1 (6.8323, 12.4554) -> (3.173, 14.2951) centre (4.7292, 12.8312) ccw
  line L2 (3.173, 14.2951) -> (-1.1137, 6.8702)
  line L3 (-1.1137, 6.8702) -> (-7.3706, 12.1447)
  arc A2 (-7.3706, 12.1447) -> (-10.7934, 9.8955) centre (-8.7476, 10.5112) ccw
  line L4 (-10.7934, 9.8955) -> (-6.5067, 2.4706)
  line L5 (-6.5067, 2.4706) -> (-14.2029, -0.3107)
  arc A3 (-14.2029, -0.3107) -> (-13.9664, -4.3996) centre (-13.4768, -2.32) ccw
  line L6 (-13.9664, -4.3996) -> (-5.393, -4.3996)
  line L7 (-5.393, -4.3996) -> (-6.8323, -12.4554)
  arc A4 (-6.8323, -12.4554) -> (-3.173, -14.2951) centre (-4.7292, -12.8312) ccw
  line L8 (-3.173, -14.2951) -> (1.1137, -6.8702)
  line L9 (1.1137, -6.8702) -> (7.3706, -12.1447)
  arc A5 (7.3706, -12.1447) -> (10.7934, -9.8955) centre (8.7476, -10.5112) ccw
  line L10 (10.7934, -9.8955) -> (6.5067, -2.4706)
  line L11 (6.5067, -2.4706) -> (14.2029, 0.3107)
  circle A6 centre (7.5637, 1.3021) radius 1
  circle A7 centre (13.4768, 2.32) radius 1
  circle A8 centre (6.8286, -8.2053) radius 1
  circle A9 centre (-2.6542, -7.2014) radius 1
  circle A10 centre (-4.7292, -12.8312) radius 1
  circle A11 centre (-10.5203, -1.8111) radius 1
  circle A12 centre (-4.9095, 5.8993) radius 1
  circle A13 centre (-8.7476, 10.5112) radius 1
  circle A14 centre (3.6917, 10.0163) radius 1
  circle A15 centre (0, 0) radius 4.75
  circle A16 centre (4.7292, 12.8312) radius 1
  circle A17 centre (2.6542, 7.2014) radius 1
  circle A18 centre (-6.8286, 8.2053) radius 1
  circle A19 centre (-13.4768, -2.32) radius 1
  circle A20 centre (-7.5637, -1.3021) radius 1
  circle A21 centre (-3.6917, -10.0163) radius 1
  circle A22 centre (8.7476, -10.5112) radius 1
  circle A23 centre (4.9095, -5.8993) radius 1
  circle A24 centre (10.5203, 1.8111) radius 1
  circle A25 centre (0, 0) radius 1.875
extrude "Выдавливание2" cut sketch "Эскиз2" against normal blind 10 contours A6 | A9 | A12 | A15 | A17 | A20 | A23 | A25
properties part number "000.303 - Шестерня привода"
